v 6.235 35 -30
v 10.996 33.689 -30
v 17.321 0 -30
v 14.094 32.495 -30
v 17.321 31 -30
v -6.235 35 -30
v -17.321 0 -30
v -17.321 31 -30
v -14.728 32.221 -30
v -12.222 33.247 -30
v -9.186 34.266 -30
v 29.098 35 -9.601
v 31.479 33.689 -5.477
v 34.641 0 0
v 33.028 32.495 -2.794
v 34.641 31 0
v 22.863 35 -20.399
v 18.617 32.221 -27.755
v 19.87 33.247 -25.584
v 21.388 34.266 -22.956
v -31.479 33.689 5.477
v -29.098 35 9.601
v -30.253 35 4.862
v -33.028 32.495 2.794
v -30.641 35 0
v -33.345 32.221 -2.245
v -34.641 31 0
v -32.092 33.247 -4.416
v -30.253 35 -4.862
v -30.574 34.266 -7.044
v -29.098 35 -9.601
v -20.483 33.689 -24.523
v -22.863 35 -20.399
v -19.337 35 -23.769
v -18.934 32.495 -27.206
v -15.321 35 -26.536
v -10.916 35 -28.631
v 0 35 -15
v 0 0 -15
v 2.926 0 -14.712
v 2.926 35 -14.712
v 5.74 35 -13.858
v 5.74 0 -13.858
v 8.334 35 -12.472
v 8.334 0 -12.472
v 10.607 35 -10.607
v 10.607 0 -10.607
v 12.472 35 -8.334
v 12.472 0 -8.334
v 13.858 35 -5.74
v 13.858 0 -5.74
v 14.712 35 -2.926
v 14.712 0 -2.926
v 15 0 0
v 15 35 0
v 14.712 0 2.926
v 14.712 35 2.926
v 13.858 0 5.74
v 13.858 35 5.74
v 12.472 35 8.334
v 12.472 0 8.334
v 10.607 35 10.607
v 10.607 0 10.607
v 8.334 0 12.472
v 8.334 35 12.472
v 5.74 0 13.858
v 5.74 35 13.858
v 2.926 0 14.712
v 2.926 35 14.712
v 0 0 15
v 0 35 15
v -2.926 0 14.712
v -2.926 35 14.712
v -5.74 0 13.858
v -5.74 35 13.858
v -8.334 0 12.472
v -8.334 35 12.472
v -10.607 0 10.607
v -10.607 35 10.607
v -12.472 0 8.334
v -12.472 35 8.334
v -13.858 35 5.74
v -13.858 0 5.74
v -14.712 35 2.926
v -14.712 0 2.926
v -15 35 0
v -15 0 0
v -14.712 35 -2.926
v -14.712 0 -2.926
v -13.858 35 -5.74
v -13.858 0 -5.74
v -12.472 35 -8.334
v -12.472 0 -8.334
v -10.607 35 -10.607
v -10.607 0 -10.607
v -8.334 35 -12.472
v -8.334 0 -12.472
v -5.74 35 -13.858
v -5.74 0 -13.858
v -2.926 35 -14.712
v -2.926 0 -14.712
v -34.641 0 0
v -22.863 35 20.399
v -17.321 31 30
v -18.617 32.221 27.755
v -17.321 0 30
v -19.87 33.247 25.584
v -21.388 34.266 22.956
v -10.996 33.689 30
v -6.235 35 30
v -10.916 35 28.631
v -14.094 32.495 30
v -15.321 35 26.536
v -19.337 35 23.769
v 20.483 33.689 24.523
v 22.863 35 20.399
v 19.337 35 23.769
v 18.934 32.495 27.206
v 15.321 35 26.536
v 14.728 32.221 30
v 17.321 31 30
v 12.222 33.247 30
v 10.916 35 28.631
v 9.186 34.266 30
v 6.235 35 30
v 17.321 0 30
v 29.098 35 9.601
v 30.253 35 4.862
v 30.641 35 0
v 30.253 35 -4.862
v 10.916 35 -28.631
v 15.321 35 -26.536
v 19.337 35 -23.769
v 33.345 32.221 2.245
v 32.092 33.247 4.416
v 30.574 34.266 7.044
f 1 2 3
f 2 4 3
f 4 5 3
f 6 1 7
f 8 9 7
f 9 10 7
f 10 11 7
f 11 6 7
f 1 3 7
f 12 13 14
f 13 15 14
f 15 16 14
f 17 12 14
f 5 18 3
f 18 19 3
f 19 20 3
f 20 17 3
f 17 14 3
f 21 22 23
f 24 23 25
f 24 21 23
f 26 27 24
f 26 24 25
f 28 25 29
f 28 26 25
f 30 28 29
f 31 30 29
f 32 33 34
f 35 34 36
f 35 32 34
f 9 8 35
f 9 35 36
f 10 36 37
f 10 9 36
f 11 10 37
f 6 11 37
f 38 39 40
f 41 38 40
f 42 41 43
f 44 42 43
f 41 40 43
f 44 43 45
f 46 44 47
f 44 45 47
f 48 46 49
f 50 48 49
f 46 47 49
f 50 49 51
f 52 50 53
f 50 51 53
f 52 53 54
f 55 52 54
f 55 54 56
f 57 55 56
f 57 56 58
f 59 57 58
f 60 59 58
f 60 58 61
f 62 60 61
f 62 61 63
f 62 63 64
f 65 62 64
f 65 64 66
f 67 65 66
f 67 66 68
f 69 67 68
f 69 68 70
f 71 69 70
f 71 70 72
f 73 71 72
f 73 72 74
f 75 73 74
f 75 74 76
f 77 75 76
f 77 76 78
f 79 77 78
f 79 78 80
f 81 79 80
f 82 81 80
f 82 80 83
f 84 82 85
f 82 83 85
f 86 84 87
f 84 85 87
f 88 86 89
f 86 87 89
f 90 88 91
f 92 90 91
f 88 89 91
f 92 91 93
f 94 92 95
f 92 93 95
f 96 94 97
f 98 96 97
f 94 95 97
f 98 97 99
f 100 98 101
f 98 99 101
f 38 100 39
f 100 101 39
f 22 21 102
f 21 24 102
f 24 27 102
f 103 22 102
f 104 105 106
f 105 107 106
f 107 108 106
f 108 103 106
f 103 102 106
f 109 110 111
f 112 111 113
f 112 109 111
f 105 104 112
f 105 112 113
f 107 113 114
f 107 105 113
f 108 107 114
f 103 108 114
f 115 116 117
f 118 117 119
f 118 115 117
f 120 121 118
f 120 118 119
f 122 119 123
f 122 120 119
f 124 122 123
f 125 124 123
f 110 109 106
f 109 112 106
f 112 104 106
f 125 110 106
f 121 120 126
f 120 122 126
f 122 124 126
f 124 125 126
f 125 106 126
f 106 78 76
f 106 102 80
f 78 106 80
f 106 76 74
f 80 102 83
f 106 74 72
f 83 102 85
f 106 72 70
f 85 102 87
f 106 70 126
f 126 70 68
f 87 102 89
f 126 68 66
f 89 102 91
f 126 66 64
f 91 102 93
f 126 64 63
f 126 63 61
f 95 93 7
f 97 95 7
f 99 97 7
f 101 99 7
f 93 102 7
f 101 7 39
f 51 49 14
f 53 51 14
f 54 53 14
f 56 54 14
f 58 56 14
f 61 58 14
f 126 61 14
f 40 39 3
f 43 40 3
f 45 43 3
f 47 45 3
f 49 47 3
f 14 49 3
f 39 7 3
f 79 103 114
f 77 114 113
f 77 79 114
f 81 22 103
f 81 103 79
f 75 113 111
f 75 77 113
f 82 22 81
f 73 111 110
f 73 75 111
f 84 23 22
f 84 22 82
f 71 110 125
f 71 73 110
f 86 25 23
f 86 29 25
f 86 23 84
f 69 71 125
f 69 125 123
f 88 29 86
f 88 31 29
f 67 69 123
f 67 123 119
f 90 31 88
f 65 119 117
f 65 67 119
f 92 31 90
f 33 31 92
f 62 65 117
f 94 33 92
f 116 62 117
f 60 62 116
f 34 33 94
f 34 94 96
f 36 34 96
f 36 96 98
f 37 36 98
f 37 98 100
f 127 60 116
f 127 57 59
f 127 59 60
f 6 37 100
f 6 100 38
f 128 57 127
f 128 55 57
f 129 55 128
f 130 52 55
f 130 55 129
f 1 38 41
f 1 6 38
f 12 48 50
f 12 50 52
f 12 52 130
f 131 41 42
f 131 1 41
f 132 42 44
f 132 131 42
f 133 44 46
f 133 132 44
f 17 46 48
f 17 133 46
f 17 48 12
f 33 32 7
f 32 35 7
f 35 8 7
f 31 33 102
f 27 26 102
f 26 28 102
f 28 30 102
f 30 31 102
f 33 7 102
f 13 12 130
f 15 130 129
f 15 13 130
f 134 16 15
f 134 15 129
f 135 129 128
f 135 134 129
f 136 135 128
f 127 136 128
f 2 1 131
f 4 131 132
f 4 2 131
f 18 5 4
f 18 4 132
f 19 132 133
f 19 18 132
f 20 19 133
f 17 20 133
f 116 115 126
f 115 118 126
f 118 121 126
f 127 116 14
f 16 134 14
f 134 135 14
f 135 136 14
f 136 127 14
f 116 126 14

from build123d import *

# Parameters (mm, degrees)
BOSS_EXTRUDE1_DEPTH = 35
SKETCH8_R           = 15
CUT_EXTRUDE1_DEPTH  = 58.662812973


with BuildPart() as part:
    # Sketch1 → Boss-Extrude1 (new body)
    with BuildSketch(Plane(origin=(0, 0, 0), x_dir=(1, 0, 0), z_dir=(0, 1, 0))):
        Polygon((-17.320508076, -30), (17.320508076, -30), (34.641016151, 0), (-34.641016151, 0), align=None)
        Polygon((-34.641016151, 0), (34.641016151, 0), (17.320508076, 30), (-17.320508076, 30), align=None)
    extrude(amount=BOSS_EXTRUDE1_DEPTH)

    # Sketch6 → Cut-Revolve2 (revolve, cut)
    with BuildSketch(Plane.XY):
        Polygon((30.641016151, 35), (34.641016151, 31), (34.641016151, 35), align=None)
    revolve(axis=Axis((0, 42.436882795, 0), (0, -1, 0)), mode=Mode.SUBTRACT)

    # Sketch8 → Cut-Extrude1 (cut, through all)
    with BuildSketch(Plane(origin=(0, 0, 0), x_dir=(-1, 0, 0), z_dir=(0, -1, 0))):
        with Locations(Location((0, 0, 0), (0, 0, 90))):
            Circle(SKETCH8_R)
    extrude(amount=-CUT_EXTRUDE1_DEPTH, mode=Mode.SUBTRACT)


solid = part.part
